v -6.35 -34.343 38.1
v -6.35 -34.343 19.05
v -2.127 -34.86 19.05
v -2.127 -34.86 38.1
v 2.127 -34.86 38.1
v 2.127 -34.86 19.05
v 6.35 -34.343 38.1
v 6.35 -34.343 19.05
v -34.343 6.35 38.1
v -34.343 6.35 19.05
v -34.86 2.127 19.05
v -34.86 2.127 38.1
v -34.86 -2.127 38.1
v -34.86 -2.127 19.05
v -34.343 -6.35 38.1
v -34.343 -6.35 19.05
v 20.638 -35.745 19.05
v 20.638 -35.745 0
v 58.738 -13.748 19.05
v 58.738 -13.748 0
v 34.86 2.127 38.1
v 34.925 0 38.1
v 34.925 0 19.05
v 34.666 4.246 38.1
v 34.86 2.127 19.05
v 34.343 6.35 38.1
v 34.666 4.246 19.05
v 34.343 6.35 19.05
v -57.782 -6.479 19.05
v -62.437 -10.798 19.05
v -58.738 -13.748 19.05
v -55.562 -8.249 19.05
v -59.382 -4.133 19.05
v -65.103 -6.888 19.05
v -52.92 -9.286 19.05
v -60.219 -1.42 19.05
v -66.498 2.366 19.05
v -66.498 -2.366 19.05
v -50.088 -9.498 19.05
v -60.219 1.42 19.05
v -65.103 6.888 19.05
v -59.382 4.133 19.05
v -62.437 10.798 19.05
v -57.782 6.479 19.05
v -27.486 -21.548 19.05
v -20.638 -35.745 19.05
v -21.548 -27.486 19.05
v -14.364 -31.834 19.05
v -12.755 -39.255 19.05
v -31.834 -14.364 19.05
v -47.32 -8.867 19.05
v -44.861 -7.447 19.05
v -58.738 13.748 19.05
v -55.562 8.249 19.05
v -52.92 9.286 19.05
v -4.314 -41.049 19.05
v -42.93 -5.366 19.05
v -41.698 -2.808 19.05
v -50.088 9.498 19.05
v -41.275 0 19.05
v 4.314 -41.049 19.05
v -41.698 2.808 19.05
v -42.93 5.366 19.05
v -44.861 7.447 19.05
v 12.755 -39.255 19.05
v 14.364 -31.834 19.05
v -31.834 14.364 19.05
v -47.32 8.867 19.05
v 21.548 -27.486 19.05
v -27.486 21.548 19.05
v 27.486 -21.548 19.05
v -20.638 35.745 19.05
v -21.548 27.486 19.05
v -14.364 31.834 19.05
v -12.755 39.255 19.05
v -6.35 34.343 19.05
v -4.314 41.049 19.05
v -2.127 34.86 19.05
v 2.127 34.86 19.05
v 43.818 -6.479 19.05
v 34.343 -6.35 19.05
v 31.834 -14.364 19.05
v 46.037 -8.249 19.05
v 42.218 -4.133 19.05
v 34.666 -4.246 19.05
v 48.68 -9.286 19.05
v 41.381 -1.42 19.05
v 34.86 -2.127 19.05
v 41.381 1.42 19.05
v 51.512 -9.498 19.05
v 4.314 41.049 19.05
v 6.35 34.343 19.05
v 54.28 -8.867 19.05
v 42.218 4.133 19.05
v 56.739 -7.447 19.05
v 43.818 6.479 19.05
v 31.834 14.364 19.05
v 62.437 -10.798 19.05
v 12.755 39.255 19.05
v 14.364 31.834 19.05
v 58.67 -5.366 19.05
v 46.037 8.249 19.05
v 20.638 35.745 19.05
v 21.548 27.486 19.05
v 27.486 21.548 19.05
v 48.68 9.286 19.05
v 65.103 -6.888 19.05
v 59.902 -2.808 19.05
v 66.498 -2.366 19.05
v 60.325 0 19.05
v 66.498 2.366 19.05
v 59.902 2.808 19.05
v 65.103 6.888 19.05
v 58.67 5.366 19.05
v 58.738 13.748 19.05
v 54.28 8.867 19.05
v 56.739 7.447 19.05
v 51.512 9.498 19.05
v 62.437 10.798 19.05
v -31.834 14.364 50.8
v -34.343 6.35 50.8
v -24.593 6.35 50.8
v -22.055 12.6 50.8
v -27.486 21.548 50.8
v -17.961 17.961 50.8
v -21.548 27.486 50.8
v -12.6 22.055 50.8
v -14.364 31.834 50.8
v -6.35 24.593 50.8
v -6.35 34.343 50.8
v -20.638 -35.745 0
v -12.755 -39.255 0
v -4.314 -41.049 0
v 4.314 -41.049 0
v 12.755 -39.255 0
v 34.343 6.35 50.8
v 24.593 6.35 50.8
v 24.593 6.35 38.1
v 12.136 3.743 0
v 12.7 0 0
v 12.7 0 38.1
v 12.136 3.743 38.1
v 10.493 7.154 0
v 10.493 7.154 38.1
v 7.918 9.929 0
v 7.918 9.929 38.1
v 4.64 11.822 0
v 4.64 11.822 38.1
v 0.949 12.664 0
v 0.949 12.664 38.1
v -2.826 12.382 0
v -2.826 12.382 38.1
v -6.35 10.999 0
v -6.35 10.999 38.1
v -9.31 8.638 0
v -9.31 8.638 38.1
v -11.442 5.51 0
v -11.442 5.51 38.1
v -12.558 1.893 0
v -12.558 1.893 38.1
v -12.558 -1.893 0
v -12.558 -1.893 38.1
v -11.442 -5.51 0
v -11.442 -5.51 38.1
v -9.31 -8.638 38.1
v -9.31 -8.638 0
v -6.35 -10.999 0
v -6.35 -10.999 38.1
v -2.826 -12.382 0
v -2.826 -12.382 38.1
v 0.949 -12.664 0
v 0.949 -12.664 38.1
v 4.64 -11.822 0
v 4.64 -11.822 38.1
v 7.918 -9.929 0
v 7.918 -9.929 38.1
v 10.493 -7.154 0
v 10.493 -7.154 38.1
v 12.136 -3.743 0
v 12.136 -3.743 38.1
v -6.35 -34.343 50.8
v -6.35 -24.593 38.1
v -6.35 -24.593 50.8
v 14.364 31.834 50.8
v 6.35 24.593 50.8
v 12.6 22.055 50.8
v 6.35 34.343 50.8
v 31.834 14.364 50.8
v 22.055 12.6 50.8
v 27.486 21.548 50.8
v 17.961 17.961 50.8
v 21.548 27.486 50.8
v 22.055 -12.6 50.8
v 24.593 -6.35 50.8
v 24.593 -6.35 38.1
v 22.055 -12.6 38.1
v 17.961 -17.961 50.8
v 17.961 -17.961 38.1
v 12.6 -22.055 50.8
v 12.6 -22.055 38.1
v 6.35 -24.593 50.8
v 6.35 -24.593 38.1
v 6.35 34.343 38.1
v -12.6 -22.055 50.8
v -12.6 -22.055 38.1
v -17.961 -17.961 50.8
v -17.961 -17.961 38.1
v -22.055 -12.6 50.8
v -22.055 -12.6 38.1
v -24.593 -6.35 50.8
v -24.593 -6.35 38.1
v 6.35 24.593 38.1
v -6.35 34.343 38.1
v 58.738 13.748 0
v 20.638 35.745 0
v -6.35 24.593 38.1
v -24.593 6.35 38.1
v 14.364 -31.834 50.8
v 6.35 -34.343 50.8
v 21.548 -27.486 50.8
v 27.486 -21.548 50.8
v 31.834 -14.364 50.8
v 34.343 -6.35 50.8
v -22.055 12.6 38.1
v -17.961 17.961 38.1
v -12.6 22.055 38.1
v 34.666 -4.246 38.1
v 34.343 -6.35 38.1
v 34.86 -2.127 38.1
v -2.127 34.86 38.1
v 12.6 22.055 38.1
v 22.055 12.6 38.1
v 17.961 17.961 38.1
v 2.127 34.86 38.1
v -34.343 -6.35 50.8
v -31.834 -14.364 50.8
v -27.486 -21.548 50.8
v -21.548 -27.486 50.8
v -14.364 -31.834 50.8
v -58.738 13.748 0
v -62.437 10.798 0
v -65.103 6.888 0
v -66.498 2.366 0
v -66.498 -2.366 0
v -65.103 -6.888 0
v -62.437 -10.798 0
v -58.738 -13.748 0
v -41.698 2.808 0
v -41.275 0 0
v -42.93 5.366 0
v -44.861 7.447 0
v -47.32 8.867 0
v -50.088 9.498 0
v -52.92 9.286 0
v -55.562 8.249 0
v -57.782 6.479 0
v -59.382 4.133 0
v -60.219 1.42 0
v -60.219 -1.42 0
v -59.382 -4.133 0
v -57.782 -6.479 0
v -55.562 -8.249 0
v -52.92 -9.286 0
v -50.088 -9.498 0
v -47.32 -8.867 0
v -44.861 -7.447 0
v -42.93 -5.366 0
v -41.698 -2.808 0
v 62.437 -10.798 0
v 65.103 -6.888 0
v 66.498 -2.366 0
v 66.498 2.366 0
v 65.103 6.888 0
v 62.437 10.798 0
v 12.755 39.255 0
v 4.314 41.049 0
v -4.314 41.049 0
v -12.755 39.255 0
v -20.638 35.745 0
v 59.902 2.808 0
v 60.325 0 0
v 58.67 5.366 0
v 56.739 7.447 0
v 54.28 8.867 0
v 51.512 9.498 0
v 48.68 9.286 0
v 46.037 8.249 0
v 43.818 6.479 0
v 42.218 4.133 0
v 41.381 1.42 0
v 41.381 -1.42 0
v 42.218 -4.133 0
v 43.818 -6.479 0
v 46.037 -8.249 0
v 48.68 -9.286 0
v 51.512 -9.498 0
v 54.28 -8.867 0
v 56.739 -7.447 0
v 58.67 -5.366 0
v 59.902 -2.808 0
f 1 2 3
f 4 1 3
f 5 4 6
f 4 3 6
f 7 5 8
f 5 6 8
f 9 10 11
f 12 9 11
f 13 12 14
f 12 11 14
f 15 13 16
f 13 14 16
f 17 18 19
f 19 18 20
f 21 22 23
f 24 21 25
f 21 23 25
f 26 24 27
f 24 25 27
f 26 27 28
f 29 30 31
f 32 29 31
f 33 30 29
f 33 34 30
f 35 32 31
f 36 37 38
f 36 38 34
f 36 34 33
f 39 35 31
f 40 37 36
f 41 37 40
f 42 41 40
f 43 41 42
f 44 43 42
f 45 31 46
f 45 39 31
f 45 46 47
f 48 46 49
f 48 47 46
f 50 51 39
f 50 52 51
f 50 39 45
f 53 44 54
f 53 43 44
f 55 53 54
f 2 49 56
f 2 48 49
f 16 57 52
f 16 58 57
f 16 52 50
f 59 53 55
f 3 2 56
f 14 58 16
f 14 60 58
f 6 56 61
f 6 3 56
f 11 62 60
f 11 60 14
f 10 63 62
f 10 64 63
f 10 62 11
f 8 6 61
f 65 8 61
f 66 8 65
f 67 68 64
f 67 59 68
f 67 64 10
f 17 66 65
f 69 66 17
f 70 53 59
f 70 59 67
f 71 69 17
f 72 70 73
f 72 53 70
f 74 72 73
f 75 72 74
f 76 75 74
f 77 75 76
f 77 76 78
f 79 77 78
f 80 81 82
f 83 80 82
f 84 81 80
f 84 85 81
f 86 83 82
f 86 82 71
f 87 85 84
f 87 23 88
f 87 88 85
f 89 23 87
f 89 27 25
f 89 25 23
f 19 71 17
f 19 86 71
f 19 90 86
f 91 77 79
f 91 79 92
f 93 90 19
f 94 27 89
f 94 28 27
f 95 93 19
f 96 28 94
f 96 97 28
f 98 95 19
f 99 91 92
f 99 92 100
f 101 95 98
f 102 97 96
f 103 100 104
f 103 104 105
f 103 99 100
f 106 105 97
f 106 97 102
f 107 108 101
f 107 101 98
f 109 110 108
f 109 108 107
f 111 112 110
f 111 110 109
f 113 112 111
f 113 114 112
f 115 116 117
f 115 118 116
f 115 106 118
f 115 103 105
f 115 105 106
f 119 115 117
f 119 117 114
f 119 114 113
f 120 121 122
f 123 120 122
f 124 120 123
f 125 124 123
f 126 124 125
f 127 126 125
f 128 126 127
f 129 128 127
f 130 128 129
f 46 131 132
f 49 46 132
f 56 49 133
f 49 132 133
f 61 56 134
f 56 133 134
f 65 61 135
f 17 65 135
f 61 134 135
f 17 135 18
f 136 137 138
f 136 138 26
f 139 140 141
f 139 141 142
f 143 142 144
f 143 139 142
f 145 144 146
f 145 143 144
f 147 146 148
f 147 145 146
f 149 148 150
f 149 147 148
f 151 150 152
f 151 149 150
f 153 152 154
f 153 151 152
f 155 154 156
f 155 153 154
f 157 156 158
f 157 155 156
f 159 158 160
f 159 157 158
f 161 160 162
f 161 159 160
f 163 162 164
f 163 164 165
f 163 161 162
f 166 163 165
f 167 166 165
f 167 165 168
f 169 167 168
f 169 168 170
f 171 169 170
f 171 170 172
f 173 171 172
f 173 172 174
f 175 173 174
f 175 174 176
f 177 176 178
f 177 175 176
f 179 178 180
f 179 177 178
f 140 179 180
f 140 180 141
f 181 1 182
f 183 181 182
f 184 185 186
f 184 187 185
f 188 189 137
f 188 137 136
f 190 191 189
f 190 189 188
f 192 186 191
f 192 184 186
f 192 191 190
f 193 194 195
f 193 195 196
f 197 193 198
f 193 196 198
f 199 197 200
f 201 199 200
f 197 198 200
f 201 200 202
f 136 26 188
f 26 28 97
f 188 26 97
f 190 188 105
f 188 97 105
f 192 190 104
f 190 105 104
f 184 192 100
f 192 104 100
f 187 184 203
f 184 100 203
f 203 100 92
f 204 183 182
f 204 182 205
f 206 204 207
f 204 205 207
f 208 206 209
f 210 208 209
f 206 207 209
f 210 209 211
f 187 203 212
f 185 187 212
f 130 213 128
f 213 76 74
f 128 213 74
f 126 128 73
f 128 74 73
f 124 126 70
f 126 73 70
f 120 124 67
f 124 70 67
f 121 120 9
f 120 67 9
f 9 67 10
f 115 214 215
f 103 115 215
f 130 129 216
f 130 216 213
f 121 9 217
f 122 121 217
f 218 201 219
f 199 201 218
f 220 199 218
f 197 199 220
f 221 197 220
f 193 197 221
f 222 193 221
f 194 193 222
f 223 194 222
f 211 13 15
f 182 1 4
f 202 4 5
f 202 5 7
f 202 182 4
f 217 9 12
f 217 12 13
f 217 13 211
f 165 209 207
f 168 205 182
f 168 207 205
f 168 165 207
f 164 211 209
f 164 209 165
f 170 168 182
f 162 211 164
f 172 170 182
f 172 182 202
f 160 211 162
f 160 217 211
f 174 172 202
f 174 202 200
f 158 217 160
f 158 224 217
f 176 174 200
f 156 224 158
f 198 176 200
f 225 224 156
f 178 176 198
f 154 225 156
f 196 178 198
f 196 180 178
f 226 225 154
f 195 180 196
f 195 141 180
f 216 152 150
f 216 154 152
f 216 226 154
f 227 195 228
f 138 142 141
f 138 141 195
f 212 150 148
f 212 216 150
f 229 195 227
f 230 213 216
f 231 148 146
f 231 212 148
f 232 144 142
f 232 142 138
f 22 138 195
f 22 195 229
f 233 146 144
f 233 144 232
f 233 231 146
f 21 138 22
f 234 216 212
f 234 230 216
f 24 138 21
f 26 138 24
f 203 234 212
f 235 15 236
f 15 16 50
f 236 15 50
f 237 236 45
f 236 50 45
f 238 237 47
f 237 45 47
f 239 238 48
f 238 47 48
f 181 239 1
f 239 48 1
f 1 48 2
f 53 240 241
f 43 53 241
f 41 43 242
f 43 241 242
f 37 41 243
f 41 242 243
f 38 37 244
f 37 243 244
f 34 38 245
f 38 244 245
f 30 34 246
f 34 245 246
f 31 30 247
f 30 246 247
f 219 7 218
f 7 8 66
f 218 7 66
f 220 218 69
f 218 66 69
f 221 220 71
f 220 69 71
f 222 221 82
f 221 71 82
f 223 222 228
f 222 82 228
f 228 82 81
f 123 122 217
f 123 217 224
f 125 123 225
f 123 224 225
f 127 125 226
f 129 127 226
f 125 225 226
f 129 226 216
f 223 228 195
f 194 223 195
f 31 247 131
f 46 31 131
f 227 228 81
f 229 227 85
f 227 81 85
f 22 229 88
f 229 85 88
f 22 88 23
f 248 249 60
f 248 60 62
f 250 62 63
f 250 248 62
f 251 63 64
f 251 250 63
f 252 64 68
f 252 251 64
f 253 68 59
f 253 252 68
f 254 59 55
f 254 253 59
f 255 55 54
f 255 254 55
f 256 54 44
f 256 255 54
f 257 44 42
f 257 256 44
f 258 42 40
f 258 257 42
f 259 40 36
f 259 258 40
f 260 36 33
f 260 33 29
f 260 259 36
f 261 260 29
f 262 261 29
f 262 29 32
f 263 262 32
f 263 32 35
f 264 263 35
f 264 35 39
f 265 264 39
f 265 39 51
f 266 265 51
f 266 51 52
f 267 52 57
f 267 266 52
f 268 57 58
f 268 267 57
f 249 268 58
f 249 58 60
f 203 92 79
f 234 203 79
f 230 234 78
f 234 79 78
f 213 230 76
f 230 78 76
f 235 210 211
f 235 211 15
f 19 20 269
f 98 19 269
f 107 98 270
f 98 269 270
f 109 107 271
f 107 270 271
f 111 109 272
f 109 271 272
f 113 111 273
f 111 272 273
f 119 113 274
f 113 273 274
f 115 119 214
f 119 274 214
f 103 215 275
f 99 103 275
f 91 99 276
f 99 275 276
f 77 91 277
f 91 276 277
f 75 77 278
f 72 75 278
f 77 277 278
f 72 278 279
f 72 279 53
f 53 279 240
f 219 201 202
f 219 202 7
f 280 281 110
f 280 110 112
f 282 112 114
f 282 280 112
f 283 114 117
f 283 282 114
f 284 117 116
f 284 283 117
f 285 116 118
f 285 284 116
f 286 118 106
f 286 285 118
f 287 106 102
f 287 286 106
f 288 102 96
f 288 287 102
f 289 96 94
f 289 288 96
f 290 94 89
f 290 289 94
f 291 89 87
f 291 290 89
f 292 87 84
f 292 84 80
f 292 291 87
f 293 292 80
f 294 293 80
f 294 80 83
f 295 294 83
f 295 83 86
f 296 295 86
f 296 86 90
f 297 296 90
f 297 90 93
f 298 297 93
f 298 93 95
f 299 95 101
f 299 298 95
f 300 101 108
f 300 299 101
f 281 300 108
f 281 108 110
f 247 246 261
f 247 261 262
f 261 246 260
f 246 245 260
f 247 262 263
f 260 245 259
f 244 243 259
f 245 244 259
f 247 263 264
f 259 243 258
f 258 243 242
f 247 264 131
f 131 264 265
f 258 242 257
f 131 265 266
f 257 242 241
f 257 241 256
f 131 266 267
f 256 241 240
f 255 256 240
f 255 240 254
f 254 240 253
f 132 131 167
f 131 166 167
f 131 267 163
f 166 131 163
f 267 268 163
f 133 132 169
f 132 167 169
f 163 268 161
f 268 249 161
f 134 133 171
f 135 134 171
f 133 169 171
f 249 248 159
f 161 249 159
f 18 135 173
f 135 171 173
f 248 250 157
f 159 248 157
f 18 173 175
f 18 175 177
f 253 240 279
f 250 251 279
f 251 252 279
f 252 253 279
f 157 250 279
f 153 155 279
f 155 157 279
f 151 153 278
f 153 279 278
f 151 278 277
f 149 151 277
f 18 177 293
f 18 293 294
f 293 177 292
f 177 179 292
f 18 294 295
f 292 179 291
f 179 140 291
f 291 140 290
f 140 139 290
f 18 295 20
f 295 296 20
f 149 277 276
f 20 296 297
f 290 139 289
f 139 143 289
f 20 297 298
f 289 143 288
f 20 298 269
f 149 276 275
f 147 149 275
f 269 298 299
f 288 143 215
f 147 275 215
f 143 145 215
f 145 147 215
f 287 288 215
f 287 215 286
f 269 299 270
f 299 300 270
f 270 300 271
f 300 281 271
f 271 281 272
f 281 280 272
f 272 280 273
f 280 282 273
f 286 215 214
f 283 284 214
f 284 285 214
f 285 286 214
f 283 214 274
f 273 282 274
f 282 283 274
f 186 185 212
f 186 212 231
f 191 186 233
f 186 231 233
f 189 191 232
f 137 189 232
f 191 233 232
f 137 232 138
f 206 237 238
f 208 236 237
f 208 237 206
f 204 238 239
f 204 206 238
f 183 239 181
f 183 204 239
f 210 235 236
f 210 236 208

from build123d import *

# Parameters (mm, degrees)
F0_R     = 9.525
F1_DEPTH = 19.05
F0_R_2   = 12.7
F2_DEPTH = 38.1
F3_DEPTH = 50.8


with BuildPart() as f1:
    # F0 (on Top) → F1 (new body)
    with BuildSketch(Plane.XY):
        with BuildLine():
            Line((20.6375, -35.745199), (58.7375, -13.748153))
            ThreePointArc((58.7375, -13.748153), (66.675, 0), (58.7375, 13.748153))
            Line((58.7375, 13.748153), (20.6375, 35.745199))
            ThreePointArc((20.6375, 35.745199), (0, 41.275), (-20.6375, 35.745199))
            Line((-20.6375, 35.745199), (-58.7375, 13.748153))
            ThreePointArc((-58.7375, 13.748153), (-66.675, 0), (-58.7375, -13.748153))
            Line((-58.7375, -13.748153), (-20.6375, -35.745199))
            ThreePointArc((-20.6375, -35.745199), (0, -41.275), (20.6375, -35.745199))
        make_face()
        with Locations((-50.8, 0)):
            Circle(F0_R, mode=Mode.SUBTRACT)
        with BuildLine():
            ThreePointArc((6.35, 34.342876), (24.695704, 24.695704), (34.342876, 6.35))
            ThreePointArc((34.342876, 6.35), (34.779164, 3.188313), (34.925, 0))
            ThreePointArc((34.925, 0), (34.779164, -3.188313), (34.342876, -6.35))
            ThreePointArc((34.342876, -6.35), (24.695704, -24.695704), (6.35, -34.342876))
            ThreePointArc((6.35, -34.342876), (0, -34.925), (-6.35, -34.342876))
            ThreePointArc((-6.35, -34.342876), (-24.695704, -24.695704), (-34.342876, -6.35))
            ThreePointArc((-34.342876, -6.35), (-34.925, 0), (-34.342876, 6.35))
            ThreePointArc((-34.342876, 6.35), (-24.695704, 24.695704), (-6.35, 34.342876))
            ThreePointArc((-6.35, 34.342876), (0, 34.925), (6.35, 34.342876))
        make_face(mode=Mode.SUBTRACT)
        with Locations((50.8, 0)):
            Circle(F0_R, mode=Mode.SUBTRACT)
    extrude(amount=F1_DEPTH)

    # F0 (on Top) → F2 (join)
    with BuildSketch(Plane.XY):
        with BuildLine():
            Line((6.35, -34.342876), (6.35, -24.593444))
            ThreePointArc((6.35, -24.593444), (0, -25.4), (-6.35, -24.593444))
            Line((-6.35, -24.593444), (-6.35, -34.342876))
            ThreePointArc((-6.35, -34.342876), (0, -34.925), (6.35, -34.342876))
        make_face()
        with BuildLine():
            Line((-6.35, -34.342876), (-6.35, -24.593444))
            ThreePointArc((-6.35, -24.593444), (-17.960512, -17.960512), (-24.593444, -6.35))
            Line((-24.593444, -6.35), (-34.342876, -6.35))
            ThreePointArc((-34.342876, -6.35), (-24.695704, -24.695704), (-6.35, -34.342876))
        make_face()
        with BuildLine():
            Line((34.342876, -6.35), (24.593444, -6.35))
            ThreePointArc((24.593444, -6.35), (17.960512, -17.960512), (6.35, -24.593444))
            Line((6.35, -24.593444), (6.35, -34.342876))
            ThreePointArc((6.35, -34.342876), (24.695704, -24.695704), (34.342876, -6.35))
        make_face()
        with BuildLine():
            ThreePointArc((24.593444, -6.35), (25.197554, -3.200509), (25.4, 0))
            ThreePointArc((25.4, 0), (25.197554, 3.200509), (24.593444, 6.35))
            ThreePointArc((24.593444, 6.35), (17.960512, 17.960512), (6.35, 24.593444))
            ThreePointArc((6.35, 24.593444), (0, 25.4), (-6.35, 24.593444))
            ThreePointArc((-6.35, 24.593444), (-17.960512, 17.960512), (-24.593444, 6.35))
            ThreePointArc((-24.593444, 6.35), (-25.4, 0), (-24.593444, -6.35))
            ThreePointArc((-24.593444, -6.35), (-17.960512, -17.960512), (-6.35, -24.593444))
            ThreePointArc((-6.35, -24.593444), (0, -25.4), (6.35, -24.593444))
            ThreePointArc((6.35, -24.593444), (17.960512, -17.960512), (24.593444, -6.35))
        make_face()
        Circle(F0_R_2, mode=Mode.SUBTRACT)
        with BuildLine():
            ThreePointArc((24.593444, 6.35), (25.197554, 3.200509), (25.4, 0))
            ThreePointArc((25.4, 0), (25.197554, -3.200509), (24.593444, -6.35))
            Line((24.593444, -6.35), (34.342876, -6.35))
            ThreePointArc((34.342876, -6.35), (34.779164, -3.188313), (34.925, 0))
            ThreePointArc((34.925, 0), (34.779164, 3.188313), (34.342876, 6.35))
            Line((34.342876, 6.35), (24.593444, 6.35))
        make_face()
        with BuildLine():
            ThreePointArc((6.35, 24.593444), (17.960512, 17.960512), (24.593444, 6.35))
            Line((24.593444, 6.35), (34.342876, 6.35))
            ThreePointArc((34.342876, 6.35), (24.695704, 24.695704), (6.35, 34.342876))
            Line((6.35, 34.342876), (6.35, 24.593444))
        make_face()
        with BuildLine():
            ThreePointArc((-24.593444, -6.35), (-25.4, 0), (-24.593444, 6.35))
            Line((-24.593444, 6.35), (-34.342876, 6.35))
            ThreePointArc((-34.342876, 6.35), (-34.925, 0), (-34.342876, -6.35))
            Line((-34.342876, -6.35), (-24.593444, -6.35))
        make_face()
        with BuildLine():
            ThreePointArc((-24.593444, 6.35), (-17.960512, 17.960512), (-6.35, 24.593444))
            Line((-6.35, 24.593444), (-6.35, 34.342876))
            ThreePointArc((-6.35, 34.342876), (-24.695704, 24.695704), (-34.342876, 6.35))
            Line((-34.342876, 6.35), (-24.593444, 6.35))
        make_face()
        with BuildLine():
            ThreePointArc((-6.35, 24.593444), (0, 25.4), (6.35, 24.593444))
            Line((6.35, 24.593444), (6.35, 34.342876))
            ThreePointArc((6.35, 34.342876), (0, 34.925), (-6.35, 34.342876))
            Line((-6.35, 34.342876), (-6.35, 24.593444))
        make_face()
    extrude(amount=F2_DEPTH)

    # F0 (on Top) → F3 (join)
    with BuildSketch(Plane.XY):
        with BuildLine():
            ThreePointArc((6.35, 24.593444), (17.960512, 17.960512), (24.593444, 6.35))
            Line((24.593444, 6.35), (34.342876, 6.35))
            ThreePointArc((34.342876, 6.35), (24.695704, 24.695704), (6.35, 34.342876))
            Line((6.35, 34.342876), (6.35, 24.593444))
        make_face()
        with BuildLine():
            Line((34.342876, -6.35), (24.593444, -6.35))
            ThreePointArc((24.593444, -6.35), (17.960512, -17.960512), (6.35, -24.593444))
            Line((6.35, -24.593444), (6.35, -34.342876))
            ThreePointArc((6.35, -34.342876), (24.695704, -24.695704), (34.342876, -6.35))
        make_face()
        with BuildLine():
            Line((-6.35, -34.342876), (-6.35, -24.593444))
            ThreePointArc((-6.35, -24.593444), (-17.960512, -17.960512), (-24.593444, -6.35))
            Line((-24.593444, -6.35), (-34.342876, -6.35))
            ThreePointArc((-34.342876, -6.35), (-24.695704, -24.695704), (-6.35, -34.342876))
        make_face()
        with BuildLine():
            ThreePointArc((-24.593444, 6.35), (-17.960512, 17.960512), (-6.35, 24.593444))
            Line((-6.35, 24.593444), (-6.35, 34.342876))
            ThreePointArc((-6.35, 34.342876), (-24.695704, 24.695704), (-34.342876, 6.35))
            Line((-34.342876, 6.35), (-24.593444, 6.35))
        make_face()
    extrude(amount=F3_DEPTH)


solid = f1.part
